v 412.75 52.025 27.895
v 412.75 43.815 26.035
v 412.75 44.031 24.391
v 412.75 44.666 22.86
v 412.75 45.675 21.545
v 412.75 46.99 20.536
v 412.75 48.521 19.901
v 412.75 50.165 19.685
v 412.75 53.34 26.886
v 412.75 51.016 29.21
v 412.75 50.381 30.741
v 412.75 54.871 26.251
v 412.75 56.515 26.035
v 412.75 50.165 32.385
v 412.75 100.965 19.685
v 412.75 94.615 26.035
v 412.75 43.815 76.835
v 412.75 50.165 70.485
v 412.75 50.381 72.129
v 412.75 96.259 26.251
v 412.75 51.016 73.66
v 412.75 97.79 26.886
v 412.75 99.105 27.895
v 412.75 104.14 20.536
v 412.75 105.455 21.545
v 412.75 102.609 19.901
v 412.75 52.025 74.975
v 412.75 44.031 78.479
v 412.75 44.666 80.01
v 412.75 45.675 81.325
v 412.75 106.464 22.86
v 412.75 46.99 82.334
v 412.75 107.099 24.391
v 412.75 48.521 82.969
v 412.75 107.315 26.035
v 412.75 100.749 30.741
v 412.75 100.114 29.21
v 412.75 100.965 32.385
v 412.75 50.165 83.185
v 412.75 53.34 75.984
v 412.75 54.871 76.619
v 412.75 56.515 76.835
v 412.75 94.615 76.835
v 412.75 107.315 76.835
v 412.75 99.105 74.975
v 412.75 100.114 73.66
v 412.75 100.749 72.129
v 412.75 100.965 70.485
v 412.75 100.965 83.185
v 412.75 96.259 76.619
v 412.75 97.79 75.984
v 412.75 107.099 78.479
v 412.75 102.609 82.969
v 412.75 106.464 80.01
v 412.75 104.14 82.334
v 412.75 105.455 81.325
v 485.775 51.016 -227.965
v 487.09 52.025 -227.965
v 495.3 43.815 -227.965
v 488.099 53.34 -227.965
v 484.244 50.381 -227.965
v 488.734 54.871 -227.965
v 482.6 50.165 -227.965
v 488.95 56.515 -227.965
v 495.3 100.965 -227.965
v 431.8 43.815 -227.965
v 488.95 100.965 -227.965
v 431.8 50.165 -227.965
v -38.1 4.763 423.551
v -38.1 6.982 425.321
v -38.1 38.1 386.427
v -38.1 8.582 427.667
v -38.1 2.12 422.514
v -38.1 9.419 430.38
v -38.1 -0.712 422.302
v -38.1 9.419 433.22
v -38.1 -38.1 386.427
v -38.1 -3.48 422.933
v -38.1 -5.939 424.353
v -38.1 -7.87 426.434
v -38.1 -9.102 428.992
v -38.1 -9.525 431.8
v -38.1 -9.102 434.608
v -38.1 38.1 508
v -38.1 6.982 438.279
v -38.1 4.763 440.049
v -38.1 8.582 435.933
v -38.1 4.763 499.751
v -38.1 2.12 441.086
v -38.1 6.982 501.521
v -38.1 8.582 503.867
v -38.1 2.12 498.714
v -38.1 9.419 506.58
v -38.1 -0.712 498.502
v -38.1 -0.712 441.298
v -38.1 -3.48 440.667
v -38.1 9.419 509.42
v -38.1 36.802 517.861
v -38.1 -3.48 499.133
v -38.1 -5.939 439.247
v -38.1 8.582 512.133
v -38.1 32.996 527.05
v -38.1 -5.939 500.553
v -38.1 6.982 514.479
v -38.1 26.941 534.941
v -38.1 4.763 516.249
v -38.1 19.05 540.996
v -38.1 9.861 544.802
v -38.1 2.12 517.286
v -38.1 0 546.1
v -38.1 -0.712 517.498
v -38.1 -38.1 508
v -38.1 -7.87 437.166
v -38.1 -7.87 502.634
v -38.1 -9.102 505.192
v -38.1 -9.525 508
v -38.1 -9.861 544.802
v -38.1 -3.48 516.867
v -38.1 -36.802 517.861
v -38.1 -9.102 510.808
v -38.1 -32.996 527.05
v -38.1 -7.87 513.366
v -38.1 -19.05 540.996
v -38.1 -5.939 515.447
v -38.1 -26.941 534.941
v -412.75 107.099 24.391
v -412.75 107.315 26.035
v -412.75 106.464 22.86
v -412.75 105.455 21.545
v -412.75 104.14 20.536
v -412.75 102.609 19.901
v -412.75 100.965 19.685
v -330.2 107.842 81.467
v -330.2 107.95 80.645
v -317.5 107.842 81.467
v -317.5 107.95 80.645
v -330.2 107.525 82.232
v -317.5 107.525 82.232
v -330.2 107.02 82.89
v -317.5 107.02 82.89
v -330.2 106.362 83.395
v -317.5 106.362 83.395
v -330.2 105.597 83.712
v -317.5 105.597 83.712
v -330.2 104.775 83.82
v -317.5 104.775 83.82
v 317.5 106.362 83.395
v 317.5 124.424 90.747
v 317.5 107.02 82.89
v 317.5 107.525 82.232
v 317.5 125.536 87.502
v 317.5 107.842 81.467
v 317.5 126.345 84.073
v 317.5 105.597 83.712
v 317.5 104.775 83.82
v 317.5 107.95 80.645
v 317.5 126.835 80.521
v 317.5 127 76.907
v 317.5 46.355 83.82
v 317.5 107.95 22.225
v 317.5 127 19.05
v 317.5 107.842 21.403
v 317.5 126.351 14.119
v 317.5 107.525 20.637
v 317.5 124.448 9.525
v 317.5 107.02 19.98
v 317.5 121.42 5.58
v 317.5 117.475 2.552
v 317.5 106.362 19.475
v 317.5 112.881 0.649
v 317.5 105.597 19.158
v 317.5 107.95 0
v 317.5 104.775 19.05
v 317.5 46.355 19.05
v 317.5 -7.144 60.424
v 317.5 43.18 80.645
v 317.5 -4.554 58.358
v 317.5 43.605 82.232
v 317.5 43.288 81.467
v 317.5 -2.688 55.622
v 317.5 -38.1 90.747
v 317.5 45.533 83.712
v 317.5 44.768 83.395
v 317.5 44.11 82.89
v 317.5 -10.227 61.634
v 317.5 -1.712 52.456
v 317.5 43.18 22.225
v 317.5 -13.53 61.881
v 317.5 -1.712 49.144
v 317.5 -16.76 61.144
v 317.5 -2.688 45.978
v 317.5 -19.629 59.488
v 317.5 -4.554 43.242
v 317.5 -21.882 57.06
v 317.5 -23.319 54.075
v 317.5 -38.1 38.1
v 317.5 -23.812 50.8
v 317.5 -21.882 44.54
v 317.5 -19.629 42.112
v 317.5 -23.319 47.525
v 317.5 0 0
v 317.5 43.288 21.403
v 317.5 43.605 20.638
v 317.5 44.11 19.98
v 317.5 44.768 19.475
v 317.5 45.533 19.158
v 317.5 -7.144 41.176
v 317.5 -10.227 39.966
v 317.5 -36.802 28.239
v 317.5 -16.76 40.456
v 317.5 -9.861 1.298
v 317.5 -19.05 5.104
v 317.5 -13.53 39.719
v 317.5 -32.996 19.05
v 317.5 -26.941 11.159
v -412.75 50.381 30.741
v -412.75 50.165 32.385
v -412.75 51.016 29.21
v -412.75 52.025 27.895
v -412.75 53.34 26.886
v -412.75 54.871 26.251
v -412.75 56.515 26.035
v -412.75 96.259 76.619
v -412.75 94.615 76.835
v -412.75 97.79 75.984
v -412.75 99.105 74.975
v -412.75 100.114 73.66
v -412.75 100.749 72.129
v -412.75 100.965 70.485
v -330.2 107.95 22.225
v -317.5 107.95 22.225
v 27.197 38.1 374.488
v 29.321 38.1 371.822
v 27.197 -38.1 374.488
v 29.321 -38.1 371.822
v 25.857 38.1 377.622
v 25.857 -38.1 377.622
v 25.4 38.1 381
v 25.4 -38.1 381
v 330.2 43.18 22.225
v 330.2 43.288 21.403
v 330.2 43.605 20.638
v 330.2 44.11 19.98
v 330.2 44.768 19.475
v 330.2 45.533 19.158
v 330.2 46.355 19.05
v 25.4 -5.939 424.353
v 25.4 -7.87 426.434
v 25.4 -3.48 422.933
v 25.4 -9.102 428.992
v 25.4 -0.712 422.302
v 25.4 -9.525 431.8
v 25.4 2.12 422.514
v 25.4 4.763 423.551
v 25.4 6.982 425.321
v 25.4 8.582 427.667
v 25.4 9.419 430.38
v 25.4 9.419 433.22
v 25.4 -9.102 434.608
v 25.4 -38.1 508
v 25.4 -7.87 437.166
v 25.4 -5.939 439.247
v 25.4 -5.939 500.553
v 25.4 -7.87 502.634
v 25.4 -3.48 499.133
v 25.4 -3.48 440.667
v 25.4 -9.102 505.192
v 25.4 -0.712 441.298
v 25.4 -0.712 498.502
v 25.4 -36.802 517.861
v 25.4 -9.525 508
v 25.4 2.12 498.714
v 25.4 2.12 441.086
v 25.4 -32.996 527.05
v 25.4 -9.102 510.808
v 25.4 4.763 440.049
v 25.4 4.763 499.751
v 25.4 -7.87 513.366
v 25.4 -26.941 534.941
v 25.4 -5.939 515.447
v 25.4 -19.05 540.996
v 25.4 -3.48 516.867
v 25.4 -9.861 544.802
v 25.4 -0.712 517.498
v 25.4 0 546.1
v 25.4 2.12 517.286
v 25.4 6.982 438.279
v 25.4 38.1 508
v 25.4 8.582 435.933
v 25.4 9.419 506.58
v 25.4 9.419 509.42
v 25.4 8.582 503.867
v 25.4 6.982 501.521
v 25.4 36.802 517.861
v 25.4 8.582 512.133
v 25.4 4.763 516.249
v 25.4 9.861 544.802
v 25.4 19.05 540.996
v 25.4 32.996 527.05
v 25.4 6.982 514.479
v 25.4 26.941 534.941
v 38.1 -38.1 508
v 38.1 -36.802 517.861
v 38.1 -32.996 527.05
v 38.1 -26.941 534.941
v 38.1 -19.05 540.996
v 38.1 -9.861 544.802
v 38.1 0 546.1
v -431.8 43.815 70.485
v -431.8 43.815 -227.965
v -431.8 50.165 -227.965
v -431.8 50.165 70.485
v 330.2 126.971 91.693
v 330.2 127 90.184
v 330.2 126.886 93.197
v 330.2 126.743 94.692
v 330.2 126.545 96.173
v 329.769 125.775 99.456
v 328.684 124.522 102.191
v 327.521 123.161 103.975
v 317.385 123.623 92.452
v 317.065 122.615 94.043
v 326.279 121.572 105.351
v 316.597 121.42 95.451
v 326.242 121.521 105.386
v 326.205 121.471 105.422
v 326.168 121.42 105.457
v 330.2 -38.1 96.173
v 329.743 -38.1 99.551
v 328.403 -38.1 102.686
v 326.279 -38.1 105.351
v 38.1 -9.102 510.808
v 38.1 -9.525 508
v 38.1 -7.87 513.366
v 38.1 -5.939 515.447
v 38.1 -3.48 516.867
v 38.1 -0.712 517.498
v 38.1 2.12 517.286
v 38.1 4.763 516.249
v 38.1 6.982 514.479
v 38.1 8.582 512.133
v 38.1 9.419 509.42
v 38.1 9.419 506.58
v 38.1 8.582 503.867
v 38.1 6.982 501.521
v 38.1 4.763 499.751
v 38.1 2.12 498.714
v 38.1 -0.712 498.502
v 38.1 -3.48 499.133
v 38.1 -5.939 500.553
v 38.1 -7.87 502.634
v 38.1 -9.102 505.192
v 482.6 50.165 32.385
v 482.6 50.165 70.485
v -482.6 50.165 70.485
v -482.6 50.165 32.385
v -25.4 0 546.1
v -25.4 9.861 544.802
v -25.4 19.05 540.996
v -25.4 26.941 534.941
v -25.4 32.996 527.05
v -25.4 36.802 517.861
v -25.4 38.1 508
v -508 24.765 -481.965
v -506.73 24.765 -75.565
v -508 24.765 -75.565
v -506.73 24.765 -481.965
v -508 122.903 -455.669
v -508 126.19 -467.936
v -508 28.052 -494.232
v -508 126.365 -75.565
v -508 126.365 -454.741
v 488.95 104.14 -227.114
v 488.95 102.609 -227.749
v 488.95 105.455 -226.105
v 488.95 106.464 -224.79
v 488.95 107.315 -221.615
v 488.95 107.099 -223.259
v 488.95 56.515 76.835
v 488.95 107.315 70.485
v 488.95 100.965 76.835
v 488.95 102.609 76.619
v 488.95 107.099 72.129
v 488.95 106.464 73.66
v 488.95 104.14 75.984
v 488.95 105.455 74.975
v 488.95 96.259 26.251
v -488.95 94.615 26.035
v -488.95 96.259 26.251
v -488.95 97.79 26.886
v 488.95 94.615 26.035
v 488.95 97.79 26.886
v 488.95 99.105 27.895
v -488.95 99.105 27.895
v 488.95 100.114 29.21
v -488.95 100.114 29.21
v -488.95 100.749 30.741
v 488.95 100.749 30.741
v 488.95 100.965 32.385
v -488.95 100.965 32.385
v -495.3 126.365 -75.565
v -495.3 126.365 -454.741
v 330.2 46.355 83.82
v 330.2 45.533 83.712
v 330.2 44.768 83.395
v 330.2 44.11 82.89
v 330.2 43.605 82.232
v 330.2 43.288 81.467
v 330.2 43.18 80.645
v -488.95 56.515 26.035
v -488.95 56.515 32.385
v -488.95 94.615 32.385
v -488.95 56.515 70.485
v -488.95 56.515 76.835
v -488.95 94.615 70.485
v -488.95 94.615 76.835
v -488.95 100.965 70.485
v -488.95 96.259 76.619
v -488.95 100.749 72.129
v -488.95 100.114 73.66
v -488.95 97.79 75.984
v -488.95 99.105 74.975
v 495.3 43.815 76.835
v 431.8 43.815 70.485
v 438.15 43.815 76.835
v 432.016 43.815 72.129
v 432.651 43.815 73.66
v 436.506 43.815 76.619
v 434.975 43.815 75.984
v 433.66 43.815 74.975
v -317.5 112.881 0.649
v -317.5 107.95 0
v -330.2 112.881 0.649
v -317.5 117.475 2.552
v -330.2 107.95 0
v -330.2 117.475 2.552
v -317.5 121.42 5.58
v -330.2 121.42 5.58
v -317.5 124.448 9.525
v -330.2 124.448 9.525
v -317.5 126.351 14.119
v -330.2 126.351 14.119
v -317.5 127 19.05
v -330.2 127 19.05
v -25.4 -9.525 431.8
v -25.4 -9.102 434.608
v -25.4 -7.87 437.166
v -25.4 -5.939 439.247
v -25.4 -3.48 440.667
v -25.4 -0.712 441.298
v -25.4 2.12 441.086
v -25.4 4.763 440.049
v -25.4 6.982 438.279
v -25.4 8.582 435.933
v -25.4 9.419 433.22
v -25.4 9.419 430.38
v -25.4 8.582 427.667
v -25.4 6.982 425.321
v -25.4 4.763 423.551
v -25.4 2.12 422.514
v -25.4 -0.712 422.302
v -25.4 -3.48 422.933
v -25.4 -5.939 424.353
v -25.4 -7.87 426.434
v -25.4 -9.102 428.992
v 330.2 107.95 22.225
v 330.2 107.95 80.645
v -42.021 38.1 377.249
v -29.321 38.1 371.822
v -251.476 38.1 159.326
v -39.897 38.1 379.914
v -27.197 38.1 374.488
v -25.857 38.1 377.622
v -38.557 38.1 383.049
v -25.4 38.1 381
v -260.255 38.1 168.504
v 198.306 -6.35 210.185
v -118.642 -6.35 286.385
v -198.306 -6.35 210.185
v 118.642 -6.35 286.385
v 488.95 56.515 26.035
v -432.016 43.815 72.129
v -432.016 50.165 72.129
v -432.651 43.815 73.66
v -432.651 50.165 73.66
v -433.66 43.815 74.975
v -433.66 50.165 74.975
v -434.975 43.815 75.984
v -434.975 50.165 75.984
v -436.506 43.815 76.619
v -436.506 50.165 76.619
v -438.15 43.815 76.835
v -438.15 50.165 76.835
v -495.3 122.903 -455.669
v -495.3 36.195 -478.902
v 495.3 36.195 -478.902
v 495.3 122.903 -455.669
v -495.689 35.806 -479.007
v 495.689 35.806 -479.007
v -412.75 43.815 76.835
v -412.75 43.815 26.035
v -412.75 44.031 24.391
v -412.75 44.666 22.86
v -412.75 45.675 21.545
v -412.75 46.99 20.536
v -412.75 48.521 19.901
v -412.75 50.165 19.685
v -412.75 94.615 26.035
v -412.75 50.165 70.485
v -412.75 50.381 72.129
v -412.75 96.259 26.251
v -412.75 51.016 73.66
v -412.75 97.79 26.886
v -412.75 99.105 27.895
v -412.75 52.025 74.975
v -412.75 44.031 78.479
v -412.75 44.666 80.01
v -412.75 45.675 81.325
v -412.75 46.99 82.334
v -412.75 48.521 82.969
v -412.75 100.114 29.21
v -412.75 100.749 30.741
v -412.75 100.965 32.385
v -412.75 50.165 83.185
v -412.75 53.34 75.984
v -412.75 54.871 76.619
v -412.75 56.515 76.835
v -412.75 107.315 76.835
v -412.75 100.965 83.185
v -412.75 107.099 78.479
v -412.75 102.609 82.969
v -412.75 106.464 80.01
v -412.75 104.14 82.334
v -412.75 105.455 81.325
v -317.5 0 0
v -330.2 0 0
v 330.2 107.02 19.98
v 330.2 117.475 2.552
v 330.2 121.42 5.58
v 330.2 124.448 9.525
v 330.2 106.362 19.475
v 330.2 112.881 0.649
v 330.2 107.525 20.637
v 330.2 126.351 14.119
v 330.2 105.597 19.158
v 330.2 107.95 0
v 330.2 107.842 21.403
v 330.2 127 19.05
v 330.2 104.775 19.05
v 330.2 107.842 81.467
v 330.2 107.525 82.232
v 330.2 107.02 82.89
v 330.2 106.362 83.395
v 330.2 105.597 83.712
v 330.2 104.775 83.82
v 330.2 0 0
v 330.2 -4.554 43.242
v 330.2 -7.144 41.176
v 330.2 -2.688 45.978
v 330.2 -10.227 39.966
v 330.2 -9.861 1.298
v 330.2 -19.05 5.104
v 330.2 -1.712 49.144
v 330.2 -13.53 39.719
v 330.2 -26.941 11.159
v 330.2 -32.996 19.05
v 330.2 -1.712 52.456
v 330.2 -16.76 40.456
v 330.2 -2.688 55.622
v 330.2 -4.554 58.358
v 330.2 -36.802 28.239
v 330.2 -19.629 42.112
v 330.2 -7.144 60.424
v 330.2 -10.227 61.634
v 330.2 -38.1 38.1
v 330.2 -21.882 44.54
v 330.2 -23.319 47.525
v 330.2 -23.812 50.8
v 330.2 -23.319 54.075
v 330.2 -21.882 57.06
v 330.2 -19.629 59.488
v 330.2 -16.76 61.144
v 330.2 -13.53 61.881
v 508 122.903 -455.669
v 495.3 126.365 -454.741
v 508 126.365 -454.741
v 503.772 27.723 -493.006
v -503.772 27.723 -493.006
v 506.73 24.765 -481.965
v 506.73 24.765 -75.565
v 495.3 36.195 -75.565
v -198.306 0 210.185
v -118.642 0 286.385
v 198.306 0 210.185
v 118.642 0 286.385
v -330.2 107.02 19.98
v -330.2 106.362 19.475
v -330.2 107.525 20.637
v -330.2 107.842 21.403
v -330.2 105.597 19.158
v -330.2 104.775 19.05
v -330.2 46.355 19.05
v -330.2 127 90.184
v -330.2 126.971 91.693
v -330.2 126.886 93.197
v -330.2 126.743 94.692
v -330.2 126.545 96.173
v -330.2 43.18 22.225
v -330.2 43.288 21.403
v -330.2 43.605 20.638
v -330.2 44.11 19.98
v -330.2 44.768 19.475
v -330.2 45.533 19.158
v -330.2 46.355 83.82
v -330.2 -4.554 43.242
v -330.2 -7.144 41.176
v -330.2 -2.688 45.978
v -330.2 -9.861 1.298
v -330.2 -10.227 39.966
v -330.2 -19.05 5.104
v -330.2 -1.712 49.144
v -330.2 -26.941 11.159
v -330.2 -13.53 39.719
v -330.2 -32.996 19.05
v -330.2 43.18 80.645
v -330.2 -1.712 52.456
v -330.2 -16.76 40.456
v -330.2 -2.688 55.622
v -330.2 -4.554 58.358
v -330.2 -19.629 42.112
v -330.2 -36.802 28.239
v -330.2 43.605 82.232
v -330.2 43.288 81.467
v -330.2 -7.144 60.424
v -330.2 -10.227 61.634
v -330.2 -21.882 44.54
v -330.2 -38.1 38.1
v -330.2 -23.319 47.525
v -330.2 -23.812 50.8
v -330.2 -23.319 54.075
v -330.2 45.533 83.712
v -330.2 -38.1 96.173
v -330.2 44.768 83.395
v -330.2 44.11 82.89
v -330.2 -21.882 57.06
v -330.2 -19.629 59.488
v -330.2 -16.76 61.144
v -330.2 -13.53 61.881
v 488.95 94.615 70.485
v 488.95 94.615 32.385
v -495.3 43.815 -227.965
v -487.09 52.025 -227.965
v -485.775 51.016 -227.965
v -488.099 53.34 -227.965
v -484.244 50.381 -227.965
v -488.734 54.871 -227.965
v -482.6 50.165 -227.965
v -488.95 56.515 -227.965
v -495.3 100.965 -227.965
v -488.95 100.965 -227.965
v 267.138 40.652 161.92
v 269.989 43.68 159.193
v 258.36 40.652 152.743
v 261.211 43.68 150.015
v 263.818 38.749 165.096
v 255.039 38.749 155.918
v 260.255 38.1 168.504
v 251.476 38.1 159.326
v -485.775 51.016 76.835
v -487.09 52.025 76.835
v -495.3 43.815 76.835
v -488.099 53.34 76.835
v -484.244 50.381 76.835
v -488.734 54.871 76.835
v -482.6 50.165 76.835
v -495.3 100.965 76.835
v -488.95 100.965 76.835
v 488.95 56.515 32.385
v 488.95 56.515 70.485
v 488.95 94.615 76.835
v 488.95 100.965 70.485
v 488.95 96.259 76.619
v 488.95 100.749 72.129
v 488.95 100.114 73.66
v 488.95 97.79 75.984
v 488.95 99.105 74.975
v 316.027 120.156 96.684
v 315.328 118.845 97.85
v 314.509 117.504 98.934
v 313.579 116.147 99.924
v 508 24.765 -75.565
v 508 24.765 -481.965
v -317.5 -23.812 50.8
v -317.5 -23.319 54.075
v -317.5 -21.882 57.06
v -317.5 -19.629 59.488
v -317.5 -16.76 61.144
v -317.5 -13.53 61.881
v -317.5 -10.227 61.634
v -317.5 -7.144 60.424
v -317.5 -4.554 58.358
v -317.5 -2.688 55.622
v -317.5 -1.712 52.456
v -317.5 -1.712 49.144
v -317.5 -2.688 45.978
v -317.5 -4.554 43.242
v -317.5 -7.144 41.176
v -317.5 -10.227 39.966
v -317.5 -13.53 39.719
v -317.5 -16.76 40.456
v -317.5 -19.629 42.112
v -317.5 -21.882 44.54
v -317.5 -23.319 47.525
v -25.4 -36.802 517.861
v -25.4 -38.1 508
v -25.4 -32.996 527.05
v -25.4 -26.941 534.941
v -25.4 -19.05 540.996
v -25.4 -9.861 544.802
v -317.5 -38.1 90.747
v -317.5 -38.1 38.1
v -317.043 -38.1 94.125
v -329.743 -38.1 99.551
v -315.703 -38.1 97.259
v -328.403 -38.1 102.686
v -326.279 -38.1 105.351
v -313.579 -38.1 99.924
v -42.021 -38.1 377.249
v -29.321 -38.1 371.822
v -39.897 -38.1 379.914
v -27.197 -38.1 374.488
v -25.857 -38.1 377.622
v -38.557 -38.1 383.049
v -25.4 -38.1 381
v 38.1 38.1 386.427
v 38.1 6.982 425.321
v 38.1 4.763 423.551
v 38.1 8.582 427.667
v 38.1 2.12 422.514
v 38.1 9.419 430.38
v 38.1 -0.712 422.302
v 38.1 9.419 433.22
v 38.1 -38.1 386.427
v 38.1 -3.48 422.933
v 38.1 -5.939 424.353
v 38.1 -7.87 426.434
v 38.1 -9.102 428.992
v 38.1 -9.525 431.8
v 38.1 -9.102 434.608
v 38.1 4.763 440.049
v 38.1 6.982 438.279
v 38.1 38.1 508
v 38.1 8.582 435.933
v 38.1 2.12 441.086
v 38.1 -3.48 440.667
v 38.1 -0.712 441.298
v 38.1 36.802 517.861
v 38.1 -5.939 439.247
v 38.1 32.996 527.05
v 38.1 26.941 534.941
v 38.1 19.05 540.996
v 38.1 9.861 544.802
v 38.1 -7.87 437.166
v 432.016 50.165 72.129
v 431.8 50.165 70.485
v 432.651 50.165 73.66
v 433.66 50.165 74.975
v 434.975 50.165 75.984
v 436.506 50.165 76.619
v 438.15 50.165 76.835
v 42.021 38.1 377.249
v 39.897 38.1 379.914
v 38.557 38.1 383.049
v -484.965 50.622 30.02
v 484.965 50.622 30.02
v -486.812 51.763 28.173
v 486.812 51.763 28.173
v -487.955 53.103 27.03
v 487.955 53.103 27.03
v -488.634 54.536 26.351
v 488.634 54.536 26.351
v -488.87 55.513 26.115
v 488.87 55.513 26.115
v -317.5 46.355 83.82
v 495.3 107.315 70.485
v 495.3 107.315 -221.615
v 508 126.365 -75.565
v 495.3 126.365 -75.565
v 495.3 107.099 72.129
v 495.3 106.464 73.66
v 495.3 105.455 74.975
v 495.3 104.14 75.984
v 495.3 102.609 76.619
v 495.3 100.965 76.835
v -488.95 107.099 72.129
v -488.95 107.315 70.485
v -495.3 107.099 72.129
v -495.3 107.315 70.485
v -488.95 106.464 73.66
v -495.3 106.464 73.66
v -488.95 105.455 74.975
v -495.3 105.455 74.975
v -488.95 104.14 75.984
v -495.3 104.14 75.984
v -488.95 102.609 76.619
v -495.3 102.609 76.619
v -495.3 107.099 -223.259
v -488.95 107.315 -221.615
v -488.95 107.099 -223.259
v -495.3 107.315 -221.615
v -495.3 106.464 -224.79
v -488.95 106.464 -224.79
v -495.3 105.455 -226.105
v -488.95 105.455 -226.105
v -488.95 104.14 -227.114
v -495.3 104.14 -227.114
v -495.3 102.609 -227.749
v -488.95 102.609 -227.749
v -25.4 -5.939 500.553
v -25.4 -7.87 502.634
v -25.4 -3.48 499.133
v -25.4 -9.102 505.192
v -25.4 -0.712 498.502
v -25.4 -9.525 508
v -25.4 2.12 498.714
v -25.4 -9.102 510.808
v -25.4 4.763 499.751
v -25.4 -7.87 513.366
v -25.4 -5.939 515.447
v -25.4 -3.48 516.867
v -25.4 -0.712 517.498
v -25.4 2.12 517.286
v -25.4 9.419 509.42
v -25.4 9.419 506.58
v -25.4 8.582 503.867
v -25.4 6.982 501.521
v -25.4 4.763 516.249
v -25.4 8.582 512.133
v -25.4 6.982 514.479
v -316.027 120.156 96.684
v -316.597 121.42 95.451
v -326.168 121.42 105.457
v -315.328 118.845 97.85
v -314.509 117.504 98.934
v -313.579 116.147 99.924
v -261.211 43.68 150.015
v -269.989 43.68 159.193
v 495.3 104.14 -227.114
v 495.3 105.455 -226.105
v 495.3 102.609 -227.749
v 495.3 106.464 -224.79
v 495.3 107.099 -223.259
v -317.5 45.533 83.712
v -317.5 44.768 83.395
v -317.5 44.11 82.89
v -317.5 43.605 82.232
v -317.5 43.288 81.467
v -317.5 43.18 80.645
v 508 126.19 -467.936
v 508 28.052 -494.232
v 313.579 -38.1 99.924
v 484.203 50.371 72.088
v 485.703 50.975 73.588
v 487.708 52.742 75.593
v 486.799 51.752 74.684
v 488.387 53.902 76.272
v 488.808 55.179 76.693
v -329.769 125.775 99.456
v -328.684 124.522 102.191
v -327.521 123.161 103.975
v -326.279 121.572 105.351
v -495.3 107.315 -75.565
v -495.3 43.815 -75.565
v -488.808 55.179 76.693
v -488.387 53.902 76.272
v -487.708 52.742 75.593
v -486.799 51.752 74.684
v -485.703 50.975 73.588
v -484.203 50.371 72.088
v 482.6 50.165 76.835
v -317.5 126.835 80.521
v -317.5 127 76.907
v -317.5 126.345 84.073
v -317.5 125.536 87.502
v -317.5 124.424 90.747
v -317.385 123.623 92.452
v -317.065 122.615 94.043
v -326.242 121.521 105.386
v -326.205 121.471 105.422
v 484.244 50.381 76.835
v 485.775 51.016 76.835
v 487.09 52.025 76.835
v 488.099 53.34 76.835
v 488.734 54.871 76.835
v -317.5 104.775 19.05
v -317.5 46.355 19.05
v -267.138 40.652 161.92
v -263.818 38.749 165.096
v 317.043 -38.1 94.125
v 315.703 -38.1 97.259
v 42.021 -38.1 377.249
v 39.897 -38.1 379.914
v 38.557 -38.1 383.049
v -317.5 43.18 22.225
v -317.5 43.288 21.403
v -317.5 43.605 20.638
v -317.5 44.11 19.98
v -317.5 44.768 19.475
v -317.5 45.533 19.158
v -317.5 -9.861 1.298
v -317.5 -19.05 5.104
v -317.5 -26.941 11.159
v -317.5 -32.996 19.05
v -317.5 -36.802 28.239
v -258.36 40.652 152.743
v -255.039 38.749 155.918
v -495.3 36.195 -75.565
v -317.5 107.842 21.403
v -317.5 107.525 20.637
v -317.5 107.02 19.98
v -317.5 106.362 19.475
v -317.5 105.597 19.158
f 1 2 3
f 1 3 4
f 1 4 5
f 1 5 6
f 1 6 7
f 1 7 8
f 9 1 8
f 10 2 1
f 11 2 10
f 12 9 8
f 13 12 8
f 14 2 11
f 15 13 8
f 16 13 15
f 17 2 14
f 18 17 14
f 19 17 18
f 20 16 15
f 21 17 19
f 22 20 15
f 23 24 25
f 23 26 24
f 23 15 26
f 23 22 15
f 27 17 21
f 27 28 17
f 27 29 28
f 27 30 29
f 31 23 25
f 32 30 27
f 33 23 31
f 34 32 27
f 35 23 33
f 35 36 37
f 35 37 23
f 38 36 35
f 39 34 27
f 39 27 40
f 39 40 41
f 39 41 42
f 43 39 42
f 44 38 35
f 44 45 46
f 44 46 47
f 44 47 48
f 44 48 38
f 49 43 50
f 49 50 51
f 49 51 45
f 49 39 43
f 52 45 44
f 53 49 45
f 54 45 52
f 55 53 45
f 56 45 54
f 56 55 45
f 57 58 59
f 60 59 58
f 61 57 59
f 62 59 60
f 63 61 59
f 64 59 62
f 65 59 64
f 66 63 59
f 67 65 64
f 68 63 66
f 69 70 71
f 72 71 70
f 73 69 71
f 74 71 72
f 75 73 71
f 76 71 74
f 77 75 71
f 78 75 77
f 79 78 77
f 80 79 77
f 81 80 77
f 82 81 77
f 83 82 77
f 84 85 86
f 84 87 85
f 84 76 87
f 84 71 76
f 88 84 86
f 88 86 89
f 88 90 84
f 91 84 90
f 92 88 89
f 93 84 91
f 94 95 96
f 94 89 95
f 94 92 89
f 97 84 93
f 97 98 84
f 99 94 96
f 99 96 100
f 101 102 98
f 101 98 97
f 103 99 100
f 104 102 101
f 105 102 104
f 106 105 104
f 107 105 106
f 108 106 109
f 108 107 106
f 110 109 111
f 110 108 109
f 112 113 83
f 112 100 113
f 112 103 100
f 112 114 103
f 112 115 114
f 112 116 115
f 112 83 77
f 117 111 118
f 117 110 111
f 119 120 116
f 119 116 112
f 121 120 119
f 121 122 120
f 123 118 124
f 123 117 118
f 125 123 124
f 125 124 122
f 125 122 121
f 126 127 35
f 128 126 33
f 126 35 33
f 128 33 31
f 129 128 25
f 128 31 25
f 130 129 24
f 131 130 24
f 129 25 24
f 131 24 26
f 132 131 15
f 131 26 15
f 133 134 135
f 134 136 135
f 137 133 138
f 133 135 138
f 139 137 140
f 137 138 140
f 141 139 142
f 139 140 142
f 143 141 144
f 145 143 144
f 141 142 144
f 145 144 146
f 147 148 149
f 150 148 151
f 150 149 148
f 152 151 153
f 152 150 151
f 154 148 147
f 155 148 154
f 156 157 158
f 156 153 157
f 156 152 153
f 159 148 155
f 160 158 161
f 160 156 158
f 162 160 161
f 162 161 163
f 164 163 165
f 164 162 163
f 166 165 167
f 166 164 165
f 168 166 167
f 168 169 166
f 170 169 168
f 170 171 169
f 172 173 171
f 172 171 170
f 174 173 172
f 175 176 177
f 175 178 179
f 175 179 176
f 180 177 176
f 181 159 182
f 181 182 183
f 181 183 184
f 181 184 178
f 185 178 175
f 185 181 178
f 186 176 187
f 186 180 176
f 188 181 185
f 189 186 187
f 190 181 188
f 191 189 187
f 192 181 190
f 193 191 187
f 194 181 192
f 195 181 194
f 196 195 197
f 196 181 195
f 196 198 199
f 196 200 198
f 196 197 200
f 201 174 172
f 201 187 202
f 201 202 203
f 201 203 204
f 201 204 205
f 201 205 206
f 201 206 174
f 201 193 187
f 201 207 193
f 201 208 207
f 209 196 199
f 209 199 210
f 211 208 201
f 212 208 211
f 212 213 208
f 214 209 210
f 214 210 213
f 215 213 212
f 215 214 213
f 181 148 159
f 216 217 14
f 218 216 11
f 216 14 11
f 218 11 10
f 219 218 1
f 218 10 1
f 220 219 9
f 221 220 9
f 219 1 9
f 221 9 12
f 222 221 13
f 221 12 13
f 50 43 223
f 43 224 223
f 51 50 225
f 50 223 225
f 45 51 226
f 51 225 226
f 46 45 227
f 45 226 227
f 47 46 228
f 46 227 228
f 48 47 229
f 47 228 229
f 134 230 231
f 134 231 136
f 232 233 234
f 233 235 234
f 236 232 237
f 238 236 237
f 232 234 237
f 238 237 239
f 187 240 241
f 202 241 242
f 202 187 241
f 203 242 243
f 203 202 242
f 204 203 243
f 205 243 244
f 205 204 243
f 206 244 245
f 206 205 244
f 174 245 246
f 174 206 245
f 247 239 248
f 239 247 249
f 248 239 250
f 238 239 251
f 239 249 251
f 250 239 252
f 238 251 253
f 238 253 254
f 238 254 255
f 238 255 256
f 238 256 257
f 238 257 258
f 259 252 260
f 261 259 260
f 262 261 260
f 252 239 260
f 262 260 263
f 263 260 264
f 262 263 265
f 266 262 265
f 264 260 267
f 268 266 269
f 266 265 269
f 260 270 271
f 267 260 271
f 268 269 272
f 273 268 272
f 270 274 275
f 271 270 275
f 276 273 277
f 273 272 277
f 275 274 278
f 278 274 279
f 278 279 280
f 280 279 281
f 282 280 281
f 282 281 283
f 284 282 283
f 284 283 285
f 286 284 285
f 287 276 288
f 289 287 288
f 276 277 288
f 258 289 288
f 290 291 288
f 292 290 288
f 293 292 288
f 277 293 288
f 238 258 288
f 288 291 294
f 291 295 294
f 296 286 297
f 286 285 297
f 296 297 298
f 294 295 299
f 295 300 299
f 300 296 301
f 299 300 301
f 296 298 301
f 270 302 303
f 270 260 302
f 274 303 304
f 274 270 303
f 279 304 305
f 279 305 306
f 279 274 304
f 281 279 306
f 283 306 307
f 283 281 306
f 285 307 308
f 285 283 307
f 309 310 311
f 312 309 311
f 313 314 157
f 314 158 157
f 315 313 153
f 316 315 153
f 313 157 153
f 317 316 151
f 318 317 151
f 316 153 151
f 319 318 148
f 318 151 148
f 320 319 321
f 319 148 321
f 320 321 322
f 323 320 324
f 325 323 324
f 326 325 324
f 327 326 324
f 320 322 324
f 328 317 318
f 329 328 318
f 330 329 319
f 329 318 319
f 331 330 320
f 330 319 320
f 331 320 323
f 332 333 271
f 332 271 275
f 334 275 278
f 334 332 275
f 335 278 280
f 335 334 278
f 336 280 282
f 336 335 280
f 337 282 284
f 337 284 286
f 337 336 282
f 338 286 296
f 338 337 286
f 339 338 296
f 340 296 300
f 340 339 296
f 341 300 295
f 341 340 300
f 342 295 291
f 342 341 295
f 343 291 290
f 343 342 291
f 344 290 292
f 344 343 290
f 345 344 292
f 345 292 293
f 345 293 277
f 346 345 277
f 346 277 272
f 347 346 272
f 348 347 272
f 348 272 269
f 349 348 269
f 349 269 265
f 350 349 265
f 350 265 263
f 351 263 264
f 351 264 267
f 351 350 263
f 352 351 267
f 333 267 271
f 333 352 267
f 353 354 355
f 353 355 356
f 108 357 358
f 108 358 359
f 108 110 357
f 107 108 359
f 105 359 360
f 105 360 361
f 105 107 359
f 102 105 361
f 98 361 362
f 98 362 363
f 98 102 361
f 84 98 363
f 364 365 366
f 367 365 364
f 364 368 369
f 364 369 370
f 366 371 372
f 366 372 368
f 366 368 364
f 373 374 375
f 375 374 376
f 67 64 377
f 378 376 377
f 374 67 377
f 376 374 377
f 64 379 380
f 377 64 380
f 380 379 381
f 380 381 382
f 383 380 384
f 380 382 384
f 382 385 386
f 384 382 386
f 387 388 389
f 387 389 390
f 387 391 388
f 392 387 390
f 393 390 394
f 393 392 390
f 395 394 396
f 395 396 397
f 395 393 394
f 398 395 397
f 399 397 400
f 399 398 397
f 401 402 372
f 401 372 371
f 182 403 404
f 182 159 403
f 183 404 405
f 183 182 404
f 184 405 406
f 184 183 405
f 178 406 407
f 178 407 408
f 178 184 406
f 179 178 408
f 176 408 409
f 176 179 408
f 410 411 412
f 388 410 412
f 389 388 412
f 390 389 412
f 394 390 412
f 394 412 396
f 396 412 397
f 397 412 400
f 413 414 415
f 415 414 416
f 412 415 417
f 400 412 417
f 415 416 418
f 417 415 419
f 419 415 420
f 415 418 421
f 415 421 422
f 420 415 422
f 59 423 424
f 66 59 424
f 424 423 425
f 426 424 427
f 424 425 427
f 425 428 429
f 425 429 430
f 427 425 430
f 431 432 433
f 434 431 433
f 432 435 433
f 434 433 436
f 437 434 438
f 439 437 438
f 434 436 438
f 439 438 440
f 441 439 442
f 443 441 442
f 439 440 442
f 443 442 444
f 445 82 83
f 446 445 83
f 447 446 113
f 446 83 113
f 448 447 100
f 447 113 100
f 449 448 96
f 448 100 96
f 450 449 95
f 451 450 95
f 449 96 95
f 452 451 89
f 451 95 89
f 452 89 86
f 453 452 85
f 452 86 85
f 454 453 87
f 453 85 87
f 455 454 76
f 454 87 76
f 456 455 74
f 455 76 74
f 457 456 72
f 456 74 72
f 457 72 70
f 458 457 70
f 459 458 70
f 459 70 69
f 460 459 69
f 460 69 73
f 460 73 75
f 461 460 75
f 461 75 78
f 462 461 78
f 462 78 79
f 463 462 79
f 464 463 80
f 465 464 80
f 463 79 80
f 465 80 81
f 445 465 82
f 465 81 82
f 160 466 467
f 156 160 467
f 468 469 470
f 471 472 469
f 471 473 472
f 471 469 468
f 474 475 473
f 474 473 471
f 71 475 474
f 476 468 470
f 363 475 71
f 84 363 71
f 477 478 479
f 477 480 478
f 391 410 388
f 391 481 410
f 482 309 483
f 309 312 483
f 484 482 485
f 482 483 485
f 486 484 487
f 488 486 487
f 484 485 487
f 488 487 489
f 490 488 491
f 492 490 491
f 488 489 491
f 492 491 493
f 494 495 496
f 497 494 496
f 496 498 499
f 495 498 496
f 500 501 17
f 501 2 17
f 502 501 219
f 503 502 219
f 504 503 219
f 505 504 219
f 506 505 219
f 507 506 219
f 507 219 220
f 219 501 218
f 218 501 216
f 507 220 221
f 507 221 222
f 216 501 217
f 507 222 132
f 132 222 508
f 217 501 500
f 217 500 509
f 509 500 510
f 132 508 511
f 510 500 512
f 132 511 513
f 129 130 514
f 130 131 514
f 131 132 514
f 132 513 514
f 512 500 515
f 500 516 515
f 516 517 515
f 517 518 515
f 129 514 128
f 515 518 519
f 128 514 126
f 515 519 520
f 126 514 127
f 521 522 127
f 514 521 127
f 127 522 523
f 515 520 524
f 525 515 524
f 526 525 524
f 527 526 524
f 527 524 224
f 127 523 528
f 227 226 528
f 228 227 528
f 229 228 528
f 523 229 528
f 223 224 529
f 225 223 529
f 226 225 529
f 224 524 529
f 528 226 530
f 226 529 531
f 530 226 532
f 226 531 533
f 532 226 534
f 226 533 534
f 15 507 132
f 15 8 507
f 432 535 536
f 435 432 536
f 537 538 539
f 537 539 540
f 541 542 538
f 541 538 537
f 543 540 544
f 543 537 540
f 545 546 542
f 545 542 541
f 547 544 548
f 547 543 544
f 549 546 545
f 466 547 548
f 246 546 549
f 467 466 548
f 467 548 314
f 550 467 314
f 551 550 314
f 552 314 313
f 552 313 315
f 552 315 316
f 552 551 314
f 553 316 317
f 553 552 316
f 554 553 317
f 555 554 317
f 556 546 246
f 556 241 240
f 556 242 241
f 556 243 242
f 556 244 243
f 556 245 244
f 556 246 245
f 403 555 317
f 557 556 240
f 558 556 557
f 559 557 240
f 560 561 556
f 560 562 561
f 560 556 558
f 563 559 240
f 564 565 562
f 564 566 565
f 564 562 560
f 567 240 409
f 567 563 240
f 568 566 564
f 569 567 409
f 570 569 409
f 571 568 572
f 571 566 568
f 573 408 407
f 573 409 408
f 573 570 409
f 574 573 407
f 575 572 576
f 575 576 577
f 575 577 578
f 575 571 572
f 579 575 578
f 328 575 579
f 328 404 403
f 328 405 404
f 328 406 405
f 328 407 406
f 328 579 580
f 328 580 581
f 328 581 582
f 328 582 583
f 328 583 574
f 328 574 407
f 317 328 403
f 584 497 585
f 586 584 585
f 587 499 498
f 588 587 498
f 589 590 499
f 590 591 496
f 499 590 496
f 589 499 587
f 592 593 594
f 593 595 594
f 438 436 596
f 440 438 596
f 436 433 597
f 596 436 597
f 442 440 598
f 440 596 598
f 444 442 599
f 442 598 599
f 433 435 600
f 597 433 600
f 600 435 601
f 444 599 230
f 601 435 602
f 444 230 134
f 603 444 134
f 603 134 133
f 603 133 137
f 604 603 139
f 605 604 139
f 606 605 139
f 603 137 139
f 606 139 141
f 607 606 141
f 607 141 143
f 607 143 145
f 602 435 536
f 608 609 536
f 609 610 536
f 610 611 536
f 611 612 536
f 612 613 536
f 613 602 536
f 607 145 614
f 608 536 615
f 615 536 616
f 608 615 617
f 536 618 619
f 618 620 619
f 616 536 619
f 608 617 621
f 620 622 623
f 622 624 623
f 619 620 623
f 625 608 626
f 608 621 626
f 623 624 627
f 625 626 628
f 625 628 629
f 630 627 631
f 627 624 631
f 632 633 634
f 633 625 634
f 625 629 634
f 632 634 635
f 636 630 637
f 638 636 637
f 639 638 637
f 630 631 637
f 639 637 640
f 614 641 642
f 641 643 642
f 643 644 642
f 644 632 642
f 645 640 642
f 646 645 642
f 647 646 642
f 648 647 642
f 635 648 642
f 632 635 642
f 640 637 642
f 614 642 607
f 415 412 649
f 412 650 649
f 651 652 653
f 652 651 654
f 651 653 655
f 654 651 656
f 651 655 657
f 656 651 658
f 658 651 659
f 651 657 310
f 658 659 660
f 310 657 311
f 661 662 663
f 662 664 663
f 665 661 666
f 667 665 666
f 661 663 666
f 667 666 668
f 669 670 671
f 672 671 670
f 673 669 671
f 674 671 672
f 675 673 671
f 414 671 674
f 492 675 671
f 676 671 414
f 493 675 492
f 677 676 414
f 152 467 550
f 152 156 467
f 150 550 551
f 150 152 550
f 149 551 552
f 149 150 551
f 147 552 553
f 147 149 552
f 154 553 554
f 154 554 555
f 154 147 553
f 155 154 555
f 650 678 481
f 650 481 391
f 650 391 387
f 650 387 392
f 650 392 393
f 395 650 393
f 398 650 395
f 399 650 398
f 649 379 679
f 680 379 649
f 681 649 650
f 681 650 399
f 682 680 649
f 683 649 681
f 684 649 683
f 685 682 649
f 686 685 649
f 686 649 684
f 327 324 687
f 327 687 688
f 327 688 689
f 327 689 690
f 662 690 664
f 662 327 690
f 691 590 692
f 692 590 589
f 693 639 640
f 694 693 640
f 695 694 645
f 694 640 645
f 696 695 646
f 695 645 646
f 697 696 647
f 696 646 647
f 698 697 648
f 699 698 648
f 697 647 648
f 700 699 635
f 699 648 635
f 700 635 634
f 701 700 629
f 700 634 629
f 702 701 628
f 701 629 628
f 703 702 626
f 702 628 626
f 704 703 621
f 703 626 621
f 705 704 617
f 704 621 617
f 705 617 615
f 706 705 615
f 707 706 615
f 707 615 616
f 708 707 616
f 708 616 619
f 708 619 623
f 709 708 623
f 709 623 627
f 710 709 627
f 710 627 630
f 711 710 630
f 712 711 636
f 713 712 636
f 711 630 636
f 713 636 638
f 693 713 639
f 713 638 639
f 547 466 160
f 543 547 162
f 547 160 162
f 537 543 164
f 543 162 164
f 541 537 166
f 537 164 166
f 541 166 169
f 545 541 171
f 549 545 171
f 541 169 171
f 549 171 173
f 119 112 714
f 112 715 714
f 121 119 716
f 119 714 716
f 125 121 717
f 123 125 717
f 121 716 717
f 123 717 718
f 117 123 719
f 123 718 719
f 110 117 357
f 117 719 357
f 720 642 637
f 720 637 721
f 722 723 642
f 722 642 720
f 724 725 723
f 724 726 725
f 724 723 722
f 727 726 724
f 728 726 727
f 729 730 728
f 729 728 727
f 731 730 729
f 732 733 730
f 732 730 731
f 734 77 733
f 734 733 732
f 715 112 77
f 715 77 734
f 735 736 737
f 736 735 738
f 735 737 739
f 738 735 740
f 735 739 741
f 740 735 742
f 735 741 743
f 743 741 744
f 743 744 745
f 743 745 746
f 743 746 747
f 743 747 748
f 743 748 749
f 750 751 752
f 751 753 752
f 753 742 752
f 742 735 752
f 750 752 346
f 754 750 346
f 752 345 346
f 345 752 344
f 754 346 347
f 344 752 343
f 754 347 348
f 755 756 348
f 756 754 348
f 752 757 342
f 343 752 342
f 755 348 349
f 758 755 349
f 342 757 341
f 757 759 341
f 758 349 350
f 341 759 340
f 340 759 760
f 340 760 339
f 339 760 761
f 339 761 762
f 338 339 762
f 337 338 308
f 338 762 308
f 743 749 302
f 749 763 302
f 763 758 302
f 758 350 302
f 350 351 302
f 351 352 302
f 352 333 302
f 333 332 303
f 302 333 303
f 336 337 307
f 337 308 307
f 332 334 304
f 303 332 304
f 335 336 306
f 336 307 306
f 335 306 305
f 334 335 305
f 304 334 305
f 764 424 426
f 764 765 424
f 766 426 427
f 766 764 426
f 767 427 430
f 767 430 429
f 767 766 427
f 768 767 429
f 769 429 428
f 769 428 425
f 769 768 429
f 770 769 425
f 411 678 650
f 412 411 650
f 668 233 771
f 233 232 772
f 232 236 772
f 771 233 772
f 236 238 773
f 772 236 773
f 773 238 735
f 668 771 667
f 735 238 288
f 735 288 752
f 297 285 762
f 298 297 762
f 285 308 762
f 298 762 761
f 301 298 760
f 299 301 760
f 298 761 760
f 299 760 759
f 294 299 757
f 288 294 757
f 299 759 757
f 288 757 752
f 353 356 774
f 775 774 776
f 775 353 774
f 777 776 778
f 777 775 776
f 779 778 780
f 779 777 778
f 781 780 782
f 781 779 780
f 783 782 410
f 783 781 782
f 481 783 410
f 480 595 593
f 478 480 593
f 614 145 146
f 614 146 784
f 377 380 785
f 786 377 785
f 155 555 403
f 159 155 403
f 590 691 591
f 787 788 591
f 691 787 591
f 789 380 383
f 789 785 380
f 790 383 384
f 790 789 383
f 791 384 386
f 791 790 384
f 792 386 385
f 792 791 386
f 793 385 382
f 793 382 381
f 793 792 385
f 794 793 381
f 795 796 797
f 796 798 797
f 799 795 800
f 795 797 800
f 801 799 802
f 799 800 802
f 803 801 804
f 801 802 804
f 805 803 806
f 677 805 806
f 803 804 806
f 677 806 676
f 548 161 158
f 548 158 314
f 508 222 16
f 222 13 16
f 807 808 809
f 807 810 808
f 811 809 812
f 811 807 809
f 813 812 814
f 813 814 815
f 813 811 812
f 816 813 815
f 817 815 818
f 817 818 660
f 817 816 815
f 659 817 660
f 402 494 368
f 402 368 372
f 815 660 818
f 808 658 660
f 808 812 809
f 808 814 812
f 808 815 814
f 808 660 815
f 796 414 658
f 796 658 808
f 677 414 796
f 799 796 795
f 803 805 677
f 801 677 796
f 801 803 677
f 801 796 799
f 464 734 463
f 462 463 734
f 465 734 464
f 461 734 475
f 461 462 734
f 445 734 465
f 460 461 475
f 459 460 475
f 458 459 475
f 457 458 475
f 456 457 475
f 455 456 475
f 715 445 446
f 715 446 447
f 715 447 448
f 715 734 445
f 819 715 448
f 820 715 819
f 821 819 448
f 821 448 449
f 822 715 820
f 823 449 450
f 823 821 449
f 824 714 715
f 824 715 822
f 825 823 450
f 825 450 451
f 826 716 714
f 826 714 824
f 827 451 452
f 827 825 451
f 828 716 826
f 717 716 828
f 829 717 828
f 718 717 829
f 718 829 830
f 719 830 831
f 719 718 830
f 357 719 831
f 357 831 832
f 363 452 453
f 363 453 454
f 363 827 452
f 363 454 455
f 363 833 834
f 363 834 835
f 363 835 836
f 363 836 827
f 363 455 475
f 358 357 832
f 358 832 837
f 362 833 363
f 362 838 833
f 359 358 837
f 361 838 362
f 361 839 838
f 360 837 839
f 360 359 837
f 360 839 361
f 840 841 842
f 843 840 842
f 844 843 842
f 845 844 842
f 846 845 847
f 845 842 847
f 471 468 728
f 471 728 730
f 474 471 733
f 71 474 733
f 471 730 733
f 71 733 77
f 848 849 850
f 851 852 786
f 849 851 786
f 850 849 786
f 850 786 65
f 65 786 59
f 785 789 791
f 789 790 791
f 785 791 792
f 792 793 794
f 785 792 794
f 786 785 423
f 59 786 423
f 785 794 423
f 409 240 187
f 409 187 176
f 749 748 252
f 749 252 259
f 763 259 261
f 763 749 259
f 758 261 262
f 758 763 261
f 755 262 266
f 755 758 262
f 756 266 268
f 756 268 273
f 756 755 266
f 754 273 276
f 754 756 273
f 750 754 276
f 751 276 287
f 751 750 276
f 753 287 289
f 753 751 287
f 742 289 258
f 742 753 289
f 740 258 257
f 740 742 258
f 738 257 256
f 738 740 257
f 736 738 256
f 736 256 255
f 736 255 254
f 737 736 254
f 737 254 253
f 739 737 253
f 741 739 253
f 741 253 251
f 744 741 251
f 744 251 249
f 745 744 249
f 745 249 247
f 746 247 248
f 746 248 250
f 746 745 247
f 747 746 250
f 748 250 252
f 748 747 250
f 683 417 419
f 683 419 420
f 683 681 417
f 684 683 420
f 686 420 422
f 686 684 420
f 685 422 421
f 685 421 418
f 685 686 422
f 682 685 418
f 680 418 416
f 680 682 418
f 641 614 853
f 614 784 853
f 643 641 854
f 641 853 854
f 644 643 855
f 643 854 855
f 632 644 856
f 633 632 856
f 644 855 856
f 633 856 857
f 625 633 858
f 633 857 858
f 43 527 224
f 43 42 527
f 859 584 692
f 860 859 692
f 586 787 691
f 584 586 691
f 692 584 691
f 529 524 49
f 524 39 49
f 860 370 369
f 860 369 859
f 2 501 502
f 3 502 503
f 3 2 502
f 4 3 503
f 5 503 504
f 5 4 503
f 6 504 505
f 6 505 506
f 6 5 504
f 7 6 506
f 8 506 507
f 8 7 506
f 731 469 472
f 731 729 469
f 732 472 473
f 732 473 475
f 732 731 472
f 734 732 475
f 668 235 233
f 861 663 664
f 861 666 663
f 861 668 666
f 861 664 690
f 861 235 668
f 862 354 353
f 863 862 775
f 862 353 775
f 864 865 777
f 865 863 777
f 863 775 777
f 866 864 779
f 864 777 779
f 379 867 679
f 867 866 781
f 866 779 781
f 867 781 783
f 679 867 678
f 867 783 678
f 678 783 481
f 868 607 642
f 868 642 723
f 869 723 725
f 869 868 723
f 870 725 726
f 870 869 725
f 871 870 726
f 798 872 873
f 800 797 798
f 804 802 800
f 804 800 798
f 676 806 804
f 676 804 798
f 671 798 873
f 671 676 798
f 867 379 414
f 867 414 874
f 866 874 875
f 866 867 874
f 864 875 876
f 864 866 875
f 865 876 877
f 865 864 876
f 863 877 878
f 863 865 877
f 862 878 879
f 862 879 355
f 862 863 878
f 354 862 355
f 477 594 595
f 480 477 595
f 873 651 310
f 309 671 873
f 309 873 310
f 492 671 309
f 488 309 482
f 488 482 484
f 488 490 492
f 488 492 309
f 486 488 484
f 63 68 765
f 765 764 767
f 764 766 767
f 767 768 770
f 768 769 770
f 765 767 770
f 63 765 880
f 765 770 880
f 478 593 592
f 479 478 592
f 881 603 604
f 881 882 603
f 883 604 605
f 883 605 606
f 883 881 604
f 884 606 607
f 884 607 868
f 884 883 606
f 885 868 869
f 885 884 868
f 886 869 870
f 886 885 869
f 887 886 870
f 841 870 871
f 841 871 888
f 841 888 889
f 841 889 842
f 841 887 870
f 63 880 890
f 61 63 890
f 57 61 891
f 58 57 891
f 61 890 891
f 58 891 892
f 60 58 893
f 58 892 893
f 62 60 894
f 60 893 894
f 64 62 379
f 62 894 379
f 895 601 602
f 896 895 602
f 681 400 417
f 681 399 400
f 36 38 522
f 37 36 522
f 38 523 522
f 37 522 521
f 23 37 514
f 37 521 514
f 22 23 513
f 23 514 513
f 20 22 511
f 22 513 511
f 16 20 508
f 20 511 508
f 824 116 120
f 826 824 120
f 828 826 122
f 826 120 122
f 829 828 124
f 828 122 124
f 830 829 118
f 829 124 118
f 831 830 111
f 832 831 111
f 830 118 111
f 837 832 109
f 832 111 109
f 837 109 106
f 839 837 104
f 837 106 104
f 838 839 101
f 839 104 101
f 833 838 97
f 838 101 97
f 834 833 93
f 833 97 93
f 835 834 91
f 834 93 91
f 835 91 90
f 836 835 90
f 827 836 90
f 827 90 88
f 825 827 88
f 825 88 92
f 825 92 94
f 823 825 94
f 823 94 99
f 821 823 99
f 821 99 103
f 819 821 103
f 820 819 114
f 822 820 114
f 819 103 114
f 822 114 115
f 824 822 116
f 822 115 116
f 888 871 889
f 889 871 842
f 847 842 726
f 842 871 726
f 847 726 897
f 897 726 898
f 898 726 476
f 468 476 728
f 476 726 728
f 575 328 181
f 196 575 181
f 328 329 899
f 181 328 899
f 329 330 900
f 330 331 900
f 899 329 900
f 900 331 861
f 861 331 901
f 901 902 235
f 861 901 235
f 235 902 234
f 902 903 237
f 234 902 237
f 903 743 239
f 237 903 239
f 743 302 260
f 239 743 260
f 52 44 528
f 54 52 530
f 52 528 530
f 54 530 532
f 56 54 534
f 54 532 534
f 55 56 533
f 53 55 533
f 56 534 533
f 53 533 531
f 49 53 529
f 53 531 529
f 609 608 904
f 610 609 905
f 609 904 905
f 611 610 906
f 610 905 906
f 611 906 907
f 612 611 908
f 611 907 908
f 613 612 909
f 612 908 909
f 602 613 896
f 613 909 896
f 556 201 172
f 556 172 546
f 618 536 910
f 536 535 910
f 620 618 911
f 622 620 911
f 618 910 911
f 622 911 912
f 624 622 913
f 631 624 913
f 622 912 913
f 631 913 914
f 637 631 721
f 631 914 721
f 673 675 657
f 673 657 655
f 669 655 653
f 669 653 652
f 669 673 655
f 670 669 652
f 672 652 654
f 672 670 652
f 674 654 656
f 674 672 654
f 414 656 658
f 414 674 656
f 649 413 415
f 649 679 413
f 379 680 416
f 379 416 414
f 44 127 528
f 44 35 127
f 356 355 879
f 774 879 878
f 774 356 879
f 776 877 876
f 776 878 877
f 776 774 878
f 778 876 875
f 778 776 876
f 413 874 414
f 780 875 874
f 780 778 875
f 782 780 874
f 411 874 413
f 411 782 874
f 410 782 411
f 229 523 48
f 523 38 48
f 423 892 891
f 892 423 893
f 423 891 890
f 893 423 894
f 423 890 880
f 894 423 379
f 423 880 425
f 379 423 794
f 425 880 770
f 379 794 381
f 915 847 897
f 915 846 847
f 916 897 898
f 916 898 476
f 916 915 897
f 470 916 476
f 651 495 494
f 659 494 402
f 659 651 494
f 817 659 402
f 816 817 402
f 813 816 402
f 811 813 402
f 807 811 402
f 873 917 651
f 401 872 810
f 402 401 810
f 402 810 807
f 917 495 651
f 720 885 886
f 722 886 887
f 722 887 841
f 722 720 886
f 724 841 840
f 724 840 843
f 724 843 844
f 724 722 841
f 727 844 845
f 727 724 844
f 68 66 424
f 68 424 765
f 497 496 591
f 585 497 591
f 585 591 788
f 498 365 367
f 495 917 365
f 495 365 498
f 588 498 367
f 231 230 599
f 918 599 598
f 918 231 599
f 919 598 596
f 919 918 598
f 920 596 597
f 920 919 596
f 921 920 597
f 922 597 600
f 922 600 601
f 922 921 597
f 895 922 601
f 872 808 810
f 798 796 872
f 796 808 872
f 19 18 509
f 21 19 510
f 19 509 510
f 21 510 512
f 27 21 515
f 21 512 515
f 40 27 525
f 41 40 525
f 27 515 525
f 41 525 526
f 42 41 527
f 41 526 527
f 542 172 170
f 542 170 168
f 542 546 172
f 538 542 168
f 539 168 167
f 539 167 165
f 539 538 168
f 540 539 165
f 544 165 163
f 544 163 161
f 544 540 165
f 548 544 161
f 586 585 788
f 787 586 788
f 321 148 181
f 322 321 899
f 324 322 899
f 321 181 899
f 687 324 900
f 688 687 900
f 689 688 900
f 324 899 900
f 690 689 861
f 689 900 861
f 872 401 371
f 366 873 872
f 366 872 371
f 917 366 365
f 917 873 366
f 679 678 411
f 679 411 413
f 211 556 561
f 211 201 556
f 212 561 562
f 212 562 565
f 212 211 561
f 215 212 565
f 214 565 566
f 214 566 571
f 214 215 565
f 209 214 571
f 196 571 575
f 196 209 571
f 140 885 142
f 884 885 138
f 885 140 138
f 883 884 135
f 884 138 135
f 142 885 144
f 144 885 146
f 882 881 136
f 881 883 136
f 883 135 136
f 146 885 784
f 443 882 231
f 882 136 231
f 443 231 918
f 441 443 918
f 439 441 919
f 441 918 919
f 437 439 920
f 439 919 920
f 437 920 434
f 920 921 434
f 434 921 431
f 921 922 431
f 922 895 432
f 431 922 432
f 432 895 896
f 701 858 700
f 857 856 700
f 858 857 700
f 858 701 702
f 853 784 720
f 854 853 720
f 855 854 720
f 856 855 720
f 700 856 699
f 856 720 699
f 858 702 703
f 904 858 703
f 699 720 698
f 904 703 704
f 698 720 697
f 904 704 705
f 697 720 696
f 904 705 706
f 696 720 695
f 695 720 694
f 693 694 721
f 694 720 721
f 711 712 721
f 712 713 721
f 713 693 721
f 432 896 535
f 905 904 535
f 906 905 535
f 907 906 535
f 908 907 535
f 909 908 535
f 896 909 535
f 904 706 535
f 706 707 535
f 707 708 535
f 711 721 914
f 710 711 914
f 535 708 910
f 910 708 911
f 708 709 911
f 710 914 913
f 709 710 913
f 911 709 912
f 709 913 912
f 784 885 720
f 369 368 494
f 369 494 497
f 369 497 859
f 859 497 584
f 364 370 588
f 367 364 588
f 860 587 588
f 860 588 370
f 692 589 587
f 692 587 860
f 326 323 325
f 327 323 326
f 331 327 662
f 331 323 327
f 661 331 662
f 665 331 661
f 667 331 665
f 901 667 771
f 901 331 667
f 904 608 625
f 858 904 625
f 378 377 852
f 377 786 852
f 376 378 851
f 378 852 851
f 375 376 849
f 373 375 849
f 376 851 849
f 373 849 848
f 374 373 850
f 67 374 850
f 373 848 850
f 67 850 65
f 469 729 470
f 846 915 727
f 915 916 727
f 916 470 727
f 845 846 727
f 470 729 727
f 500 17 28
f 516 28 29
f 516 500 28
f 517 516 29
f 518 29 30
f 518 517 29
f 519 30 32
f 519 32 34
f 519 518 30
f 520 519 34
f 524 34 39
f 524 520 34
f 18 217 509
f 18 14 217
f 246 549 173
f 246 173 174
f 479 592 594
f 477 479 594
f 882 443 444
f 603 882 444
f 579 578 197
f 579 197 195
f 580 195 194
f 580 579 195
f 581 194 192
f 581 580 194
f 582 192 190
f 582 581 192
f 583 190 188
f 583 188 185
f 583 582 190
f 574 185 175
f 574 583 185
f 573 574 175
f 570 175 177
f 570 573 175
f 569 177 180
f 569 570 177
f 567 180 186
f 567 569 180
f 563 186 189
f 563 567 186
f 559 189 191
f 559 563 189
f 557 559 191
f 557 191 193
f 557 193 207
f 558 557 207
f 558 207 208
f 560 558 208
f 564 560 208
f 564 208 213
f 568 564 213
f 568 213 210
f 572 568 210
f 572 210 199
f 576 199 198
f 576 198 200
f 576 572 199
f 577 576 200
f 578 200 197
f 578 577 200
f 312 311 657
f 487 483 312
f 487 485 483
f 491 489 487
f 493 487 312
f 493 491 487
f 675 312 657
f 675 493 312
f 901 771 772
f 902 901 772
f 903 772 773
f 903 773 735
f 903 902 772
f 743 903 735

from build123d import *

# Parameters (mm, degrees)
F1_W         = 12.7
F1_H         = 76.2
F4_DEPTH     = 88.9
F6_DEPTH     = 284.1060751771
F7_R         = 12.7
F8_R         = 38.09999
F9_R         = 9.525
F10_DEPTH    = 12.7
F11_R        = 11.1125
F12_DEPTH    = 12.7
F13_R        = 19.05
F14_W        = 64.77
F14_H        = 64.77
F15_DEPTH    = 12.7
F16_R        = 3.175
F18_W        = 63.5
F18_H        = 63.5
F18_W_2      = 50.8
F18_H_2      = 50.8
F19_DEPTH    = 412.75
F20_R        = 6.35
F22_DEPTH    = 6.35
F23_W        = 38.1
F23_H        = 38.1
F24_DEPTH    = 488.95
F25_T1_DEPTH = 69.85
F27_DEPTH    = 304.8
F28_R        = 6.35
F31_DEPTH    = 12.7
F33_W        = 1016
F33_H        = 101.6
F34_DEPTH    = 12.7
F35_SIZE     = 11.43
F36_SIZE     = 11.43


# Not quite as in the source:
# - a fillet or chamfer that OpenCascade refuses, or shapes differently, is made with other operations: its cross-section is extruded or revolved along the edge and cut away or added
# - a fillet or chamfer is up to 0.001 mm smaller than in the source, because OpenCascade refuses the exact size


with BuildPart() as f2:
    # F2: sweep along a path in F0
    with BuildLine(Plane.XZ) as f2_path:
        Line((-330.2, 0), (-330.2, 101.6))
        Line((-330.2, 101.6), (-38.1, 381))
        Line((-38.1, 381), (-38.1, 546.1))
    # F1 (on Top) → F2 (sweep)
    with BuildSketch(Plane.XY):
        with Locations((-323.85, 0)):
            Rectangle(F1_W, F1_H)
    sweep(path=f2_path.line, transition=Transition.RIGHT)

    # F3 (on face) → F4 (join)
    with BuildSketch(Plane(origin=(0, 38.1, 0), x_dir=(-1, 0, 0), z_dir=(0, 1, 0))):
        Polygon((330.2, 0), (330.2, 101.6), (265.9571388996, 163.0496932265), (257.1786112958, 153.8721416407), (317.5, 96.1734220106), (317.5, 0), align=None)
    extrude(amount=F4_DEPTH)

    # F5 (on face) → F6 (cut, through all)
    with BuildSketch(Plane(origin=(-208.5156959526, 0, 217.9936821323), x_dir=(0.7226418571, 0, 0.691222646), z_dir=(-0.691222646, 0, 0.7226418571))):
        Polygon((-79.4881203999, 38.1), (-79.4881203999, 127), (-168.3881203999, 127), align=None)
    extrude(amount=-F6_DEPTH, mode=Mode.SUBTRACT)

    # F7
    f7_edges = [f2.edges().sort_by_distance(p)[0] for p in [
        (-330.2, 44.45, 101.6),
        (-317.5, 41.736711, 96.173422),
        (-38.1, 0, 381),
        (-25.4, 0, 375.573422),
    ]]
    fillet(f7_edges, radius=F7_R)

    # F8 (radius 38.1 in the source; OpenCascade refuses exactly that, so slightly less here)
    f8_edges = [f2.edges().sort_by_distance(p)[0] for p in [
        (-31.75, -38.1, 546.1),
        (-31.75, 38.1, 546.1),
        (-323.85, -38.1, 0),
    ]]
    fillet(f8_edges, radius=F8_R)

    # F9 (on face) → F10 (cut, through all)
    with BuildSketch(Plane(origin=(-38.1, 0, 0), x_dir=(0, -1, 0), z_dir=(-1, 0, 0))):
        with Locations((0, 508)):
            Circle(F9_R)
        with Locations((0, 431.8)):
            Circle(F9_R)
    extrude(amount=-F10_DEPTH, mode=Mode.SUBTRACT)

    # F11 (on face) → F12 (cut, through all)
    with BuildSketch(Plane(origin=(-330.2, 0, 0), x_dir=(0, -1, 0), z_dir=(-1, 0, 0))):
        with Locations((12.7, 50.8)):
            Circle(F11_R)
    extrude(amount=-F12_DEPTH, mode=Mode.SUBTRACT)

    # F13
    f13_edges = [f2.edges().sort_by_distance(p)[0] for p in [
        (-323.85, 127, 0),
        (-323.429135, 127, 94.521368),
        (-261.567875, 38.1, 158.460917),
    ]]
    fillet(f13_edges, radius=F13_R)

    # F14 (on face) → F15 (cut, through all)
    with BuildSketch(Plane(origin=(-330.2, 0, 0), x_dir=(0, -1, 0), z_dir=(-1, 0, 0))):
        with Locations((-75.565, 51.435)):
            Rectangle(F14_W, F14_H)
    extrude(amount=-F15_DEPTH, mode=Mode.SUBTRACT)

    # F16
    f16_edges = [f2.edges().sort_by_distance(p)[0] for p in [
        (-323.85, 107.95, 83.82),
        (-323.85, 43.18, 83.82),
        (-323.85, 43.18, 19.05),
        (-323.85, 107.95, 19.05),
    ]]
    fillet(f16_edges, radius=F16_R)


with BuildPart() as f17_1:
    # F17: instance of F2
    add(f2.part.mirror(Plane.YZ))


with BuildPart() as f19:
    # F18 (on Right) → F19 (new body, symmetric)
    with BuildSketch(Plane.YZ):
        with Locations((75.565, 51.435)):
            Rectangle(F18_W, F18_H)
        with Locations((75.565, 51.435)):
            Rectangle(F18_W_2, F18_H_2, mode=Mode.SUBTRACT)
    extrude(amount=F19_DEPTH, both=True)

    # F20
    f20_edges = [f19.edges().sort_by_distance(p)[0] for p in [
        (0, 100.965, 76.835),
        (0, 50.165, 76.835),
        (0, 50.165, 26.035),
        (0, 100.965, 26.035),
        (0, 43.815, 83.185),
        (0, 43.815, 19.685),
        (0, 107.315, 19.685),
        (0, 107.315, 83.185),
    ]]
    fillet(f20_edges, radius=F20_R)


with BuildPart() as f22:
    # F21 (on Front) → F22 (new body)
    with BuildSketch(Plane.XZ):
        Polygon((-118.6424411929, 286.385), (-198.3060775565, 210.185), (198.3060775565, 210.185), (118.6424411929, 286.385), align=None)
    extrude(amount=F22_DEPTH)


with BuildPart() as f24:
    # F23 (on Right) → F24 (new body, symmetric)
    with BuildSketch(Plane.YZ):
        with BuildLine():
            ThreePointArc((100.965, 70.485), (99.1051280605, 74.9751280605), (94.615, 76.835))
            Line((94.615, 76.835), (56.515, 76.835))
            ThreePointArc((56.515, 76.835), (52.0248719395, 74.9751280605), (50.165, 70.485))
            Line((50.165, 70.485), (50.165, 32.385))
            ThreePointArc((50.165, 32.385), (52.0248719395, 27.8948719395), (56.515, 26.035))
            Line((56.515, 26.035), (94.615, 26.035))
            ThreePointArc((94.615, 26.035), (99.1051280605, 27.8948719395), (100.965, 32.385))
            Line((100.965, 32.385), (100.965, 70.485))
        make_face()
        with Locations((75.565, 51.435)):
            Rectangle(F23_W, F23_H, mode=Mode.SUBTRACT)
    extrude(amount=F24_DEPTH, both=True)

    # F25: fillet of radius 6.35 on 2 edges, made by hand

    # F25_s2 → F25_t1 (cut)
    with BuildSketch(Plane.XY.offset(16.51)):
        with BuildLine():
            ThreePointArc((-482.6, 50.165), (-487.0901280605, 52.0248719395), (-488.95, 56.515))
            Line((-488.95, 56.515), (-488.95, 50.165))
            Line((-488.95, 50.165), (-482.6, 50.165))
        make_face()
        with BuildLine():
            ThreePointArc((482.6, 50.165), (487.0901280605, 52.0248719395), (488.95, 56.515))
            Line((488.95, 56.515), (488.95, 50.165))
            Line((488.95, 50.165), (482.6, 50.165))
        make_face()
    extrude(amount=F25_T1_DEPTH, mode=Mode.SUBTRACT)


with BuildPart() as f27:
    # F26 (on face) → F27 (new body)
    with BuildSketch(Plane.XY.offset(76.835)):
        with BuildLine():
            Line((-431.8, 43.815), (-431.8, 50.165))
            Line((-431.8, 50.165), (-482.6, 50.165))
            ThreePointArc((-482.6, 50.165), (-487.0901280605, 52.0248719395), (-488.95, 56.515))
            Line((-488.95, 56.515), (-488.95, 107.315))
            Line((-488.95, 107.315), (-495.3, 107.315))
            Line((-495.3, 107.315), (-495.3, 43.815))
            Line((-495.3, 43.815), (-431.8, 43.815))
        make_face()
    extrude(amount=-F27_DEPTH)

    # F28
    f28_edges = [f27.edges().sort_by_distance(p)[0] for p in [
        (-431.8, 46.99, 76.835),
        (-492.125, 107.315, 76.835),
        (-492.125, 107.315, -227.965),
    ]]
    fillet(f28_edges, radius=F28_R)


with BuildPart() as f29_1:
    # F29: instance of F27
    add(f27.part.mirror(Plane.YZ))


with BuildPart() as f31:
    # F30 (on face) → F31 (new body)
    with BuildSketch(Plane.YZ.offset(495.3)):
        Polygon((126.365, -454.741362049), (126.365, -75.565), (24.765, -75.565), (24.765, -481.965), align=None)
    extrude(amount=F31_DEPTH)


with BuildPart() as f27_1:
    add(f27.part)

    # F32: F31 across plane
    add(f31.part.mirror(Plane.YZ))

    add(f31.part)  # F34 merges F31
    # F33 (on face) → F34 (join)
    with BuildSketch(Plane(origin=(0, 122.1501904376, -455.8707168675), x_dir=(1, 0, 0), z_dir=(0, 0.2588190451, -0.9659258263))):
        with Locations((0, 50.0205679848)):
            Rectangle(F33_W, F33_H)
    extrude(amount=F34_DEPTH)

    # F35
    f35_edges = [f27_1.edges().sort_by_distance(p)[0] for p in [
        (-495.3, 24.765, -278.765),
        (495.3, 24.765, -278.765),
    ]]
    chamfer(f35_edges, length=F35_SIZE)

    # F36
    f36_edges = [f27_1.edges().sort_by_distance(p)[0] for p in [
        (501.015, 24.765, -481.965),
        (0, 24.765, -481.965),
        (-501.015, 24.765, -481.965),
    ]]
    chamfer(f36_edges, length=F36_SIZE)


solid = Compound([f2.part, f17_1.part, f19.part, f22.part, f24.part, f29_1.part, f27_1.part])
